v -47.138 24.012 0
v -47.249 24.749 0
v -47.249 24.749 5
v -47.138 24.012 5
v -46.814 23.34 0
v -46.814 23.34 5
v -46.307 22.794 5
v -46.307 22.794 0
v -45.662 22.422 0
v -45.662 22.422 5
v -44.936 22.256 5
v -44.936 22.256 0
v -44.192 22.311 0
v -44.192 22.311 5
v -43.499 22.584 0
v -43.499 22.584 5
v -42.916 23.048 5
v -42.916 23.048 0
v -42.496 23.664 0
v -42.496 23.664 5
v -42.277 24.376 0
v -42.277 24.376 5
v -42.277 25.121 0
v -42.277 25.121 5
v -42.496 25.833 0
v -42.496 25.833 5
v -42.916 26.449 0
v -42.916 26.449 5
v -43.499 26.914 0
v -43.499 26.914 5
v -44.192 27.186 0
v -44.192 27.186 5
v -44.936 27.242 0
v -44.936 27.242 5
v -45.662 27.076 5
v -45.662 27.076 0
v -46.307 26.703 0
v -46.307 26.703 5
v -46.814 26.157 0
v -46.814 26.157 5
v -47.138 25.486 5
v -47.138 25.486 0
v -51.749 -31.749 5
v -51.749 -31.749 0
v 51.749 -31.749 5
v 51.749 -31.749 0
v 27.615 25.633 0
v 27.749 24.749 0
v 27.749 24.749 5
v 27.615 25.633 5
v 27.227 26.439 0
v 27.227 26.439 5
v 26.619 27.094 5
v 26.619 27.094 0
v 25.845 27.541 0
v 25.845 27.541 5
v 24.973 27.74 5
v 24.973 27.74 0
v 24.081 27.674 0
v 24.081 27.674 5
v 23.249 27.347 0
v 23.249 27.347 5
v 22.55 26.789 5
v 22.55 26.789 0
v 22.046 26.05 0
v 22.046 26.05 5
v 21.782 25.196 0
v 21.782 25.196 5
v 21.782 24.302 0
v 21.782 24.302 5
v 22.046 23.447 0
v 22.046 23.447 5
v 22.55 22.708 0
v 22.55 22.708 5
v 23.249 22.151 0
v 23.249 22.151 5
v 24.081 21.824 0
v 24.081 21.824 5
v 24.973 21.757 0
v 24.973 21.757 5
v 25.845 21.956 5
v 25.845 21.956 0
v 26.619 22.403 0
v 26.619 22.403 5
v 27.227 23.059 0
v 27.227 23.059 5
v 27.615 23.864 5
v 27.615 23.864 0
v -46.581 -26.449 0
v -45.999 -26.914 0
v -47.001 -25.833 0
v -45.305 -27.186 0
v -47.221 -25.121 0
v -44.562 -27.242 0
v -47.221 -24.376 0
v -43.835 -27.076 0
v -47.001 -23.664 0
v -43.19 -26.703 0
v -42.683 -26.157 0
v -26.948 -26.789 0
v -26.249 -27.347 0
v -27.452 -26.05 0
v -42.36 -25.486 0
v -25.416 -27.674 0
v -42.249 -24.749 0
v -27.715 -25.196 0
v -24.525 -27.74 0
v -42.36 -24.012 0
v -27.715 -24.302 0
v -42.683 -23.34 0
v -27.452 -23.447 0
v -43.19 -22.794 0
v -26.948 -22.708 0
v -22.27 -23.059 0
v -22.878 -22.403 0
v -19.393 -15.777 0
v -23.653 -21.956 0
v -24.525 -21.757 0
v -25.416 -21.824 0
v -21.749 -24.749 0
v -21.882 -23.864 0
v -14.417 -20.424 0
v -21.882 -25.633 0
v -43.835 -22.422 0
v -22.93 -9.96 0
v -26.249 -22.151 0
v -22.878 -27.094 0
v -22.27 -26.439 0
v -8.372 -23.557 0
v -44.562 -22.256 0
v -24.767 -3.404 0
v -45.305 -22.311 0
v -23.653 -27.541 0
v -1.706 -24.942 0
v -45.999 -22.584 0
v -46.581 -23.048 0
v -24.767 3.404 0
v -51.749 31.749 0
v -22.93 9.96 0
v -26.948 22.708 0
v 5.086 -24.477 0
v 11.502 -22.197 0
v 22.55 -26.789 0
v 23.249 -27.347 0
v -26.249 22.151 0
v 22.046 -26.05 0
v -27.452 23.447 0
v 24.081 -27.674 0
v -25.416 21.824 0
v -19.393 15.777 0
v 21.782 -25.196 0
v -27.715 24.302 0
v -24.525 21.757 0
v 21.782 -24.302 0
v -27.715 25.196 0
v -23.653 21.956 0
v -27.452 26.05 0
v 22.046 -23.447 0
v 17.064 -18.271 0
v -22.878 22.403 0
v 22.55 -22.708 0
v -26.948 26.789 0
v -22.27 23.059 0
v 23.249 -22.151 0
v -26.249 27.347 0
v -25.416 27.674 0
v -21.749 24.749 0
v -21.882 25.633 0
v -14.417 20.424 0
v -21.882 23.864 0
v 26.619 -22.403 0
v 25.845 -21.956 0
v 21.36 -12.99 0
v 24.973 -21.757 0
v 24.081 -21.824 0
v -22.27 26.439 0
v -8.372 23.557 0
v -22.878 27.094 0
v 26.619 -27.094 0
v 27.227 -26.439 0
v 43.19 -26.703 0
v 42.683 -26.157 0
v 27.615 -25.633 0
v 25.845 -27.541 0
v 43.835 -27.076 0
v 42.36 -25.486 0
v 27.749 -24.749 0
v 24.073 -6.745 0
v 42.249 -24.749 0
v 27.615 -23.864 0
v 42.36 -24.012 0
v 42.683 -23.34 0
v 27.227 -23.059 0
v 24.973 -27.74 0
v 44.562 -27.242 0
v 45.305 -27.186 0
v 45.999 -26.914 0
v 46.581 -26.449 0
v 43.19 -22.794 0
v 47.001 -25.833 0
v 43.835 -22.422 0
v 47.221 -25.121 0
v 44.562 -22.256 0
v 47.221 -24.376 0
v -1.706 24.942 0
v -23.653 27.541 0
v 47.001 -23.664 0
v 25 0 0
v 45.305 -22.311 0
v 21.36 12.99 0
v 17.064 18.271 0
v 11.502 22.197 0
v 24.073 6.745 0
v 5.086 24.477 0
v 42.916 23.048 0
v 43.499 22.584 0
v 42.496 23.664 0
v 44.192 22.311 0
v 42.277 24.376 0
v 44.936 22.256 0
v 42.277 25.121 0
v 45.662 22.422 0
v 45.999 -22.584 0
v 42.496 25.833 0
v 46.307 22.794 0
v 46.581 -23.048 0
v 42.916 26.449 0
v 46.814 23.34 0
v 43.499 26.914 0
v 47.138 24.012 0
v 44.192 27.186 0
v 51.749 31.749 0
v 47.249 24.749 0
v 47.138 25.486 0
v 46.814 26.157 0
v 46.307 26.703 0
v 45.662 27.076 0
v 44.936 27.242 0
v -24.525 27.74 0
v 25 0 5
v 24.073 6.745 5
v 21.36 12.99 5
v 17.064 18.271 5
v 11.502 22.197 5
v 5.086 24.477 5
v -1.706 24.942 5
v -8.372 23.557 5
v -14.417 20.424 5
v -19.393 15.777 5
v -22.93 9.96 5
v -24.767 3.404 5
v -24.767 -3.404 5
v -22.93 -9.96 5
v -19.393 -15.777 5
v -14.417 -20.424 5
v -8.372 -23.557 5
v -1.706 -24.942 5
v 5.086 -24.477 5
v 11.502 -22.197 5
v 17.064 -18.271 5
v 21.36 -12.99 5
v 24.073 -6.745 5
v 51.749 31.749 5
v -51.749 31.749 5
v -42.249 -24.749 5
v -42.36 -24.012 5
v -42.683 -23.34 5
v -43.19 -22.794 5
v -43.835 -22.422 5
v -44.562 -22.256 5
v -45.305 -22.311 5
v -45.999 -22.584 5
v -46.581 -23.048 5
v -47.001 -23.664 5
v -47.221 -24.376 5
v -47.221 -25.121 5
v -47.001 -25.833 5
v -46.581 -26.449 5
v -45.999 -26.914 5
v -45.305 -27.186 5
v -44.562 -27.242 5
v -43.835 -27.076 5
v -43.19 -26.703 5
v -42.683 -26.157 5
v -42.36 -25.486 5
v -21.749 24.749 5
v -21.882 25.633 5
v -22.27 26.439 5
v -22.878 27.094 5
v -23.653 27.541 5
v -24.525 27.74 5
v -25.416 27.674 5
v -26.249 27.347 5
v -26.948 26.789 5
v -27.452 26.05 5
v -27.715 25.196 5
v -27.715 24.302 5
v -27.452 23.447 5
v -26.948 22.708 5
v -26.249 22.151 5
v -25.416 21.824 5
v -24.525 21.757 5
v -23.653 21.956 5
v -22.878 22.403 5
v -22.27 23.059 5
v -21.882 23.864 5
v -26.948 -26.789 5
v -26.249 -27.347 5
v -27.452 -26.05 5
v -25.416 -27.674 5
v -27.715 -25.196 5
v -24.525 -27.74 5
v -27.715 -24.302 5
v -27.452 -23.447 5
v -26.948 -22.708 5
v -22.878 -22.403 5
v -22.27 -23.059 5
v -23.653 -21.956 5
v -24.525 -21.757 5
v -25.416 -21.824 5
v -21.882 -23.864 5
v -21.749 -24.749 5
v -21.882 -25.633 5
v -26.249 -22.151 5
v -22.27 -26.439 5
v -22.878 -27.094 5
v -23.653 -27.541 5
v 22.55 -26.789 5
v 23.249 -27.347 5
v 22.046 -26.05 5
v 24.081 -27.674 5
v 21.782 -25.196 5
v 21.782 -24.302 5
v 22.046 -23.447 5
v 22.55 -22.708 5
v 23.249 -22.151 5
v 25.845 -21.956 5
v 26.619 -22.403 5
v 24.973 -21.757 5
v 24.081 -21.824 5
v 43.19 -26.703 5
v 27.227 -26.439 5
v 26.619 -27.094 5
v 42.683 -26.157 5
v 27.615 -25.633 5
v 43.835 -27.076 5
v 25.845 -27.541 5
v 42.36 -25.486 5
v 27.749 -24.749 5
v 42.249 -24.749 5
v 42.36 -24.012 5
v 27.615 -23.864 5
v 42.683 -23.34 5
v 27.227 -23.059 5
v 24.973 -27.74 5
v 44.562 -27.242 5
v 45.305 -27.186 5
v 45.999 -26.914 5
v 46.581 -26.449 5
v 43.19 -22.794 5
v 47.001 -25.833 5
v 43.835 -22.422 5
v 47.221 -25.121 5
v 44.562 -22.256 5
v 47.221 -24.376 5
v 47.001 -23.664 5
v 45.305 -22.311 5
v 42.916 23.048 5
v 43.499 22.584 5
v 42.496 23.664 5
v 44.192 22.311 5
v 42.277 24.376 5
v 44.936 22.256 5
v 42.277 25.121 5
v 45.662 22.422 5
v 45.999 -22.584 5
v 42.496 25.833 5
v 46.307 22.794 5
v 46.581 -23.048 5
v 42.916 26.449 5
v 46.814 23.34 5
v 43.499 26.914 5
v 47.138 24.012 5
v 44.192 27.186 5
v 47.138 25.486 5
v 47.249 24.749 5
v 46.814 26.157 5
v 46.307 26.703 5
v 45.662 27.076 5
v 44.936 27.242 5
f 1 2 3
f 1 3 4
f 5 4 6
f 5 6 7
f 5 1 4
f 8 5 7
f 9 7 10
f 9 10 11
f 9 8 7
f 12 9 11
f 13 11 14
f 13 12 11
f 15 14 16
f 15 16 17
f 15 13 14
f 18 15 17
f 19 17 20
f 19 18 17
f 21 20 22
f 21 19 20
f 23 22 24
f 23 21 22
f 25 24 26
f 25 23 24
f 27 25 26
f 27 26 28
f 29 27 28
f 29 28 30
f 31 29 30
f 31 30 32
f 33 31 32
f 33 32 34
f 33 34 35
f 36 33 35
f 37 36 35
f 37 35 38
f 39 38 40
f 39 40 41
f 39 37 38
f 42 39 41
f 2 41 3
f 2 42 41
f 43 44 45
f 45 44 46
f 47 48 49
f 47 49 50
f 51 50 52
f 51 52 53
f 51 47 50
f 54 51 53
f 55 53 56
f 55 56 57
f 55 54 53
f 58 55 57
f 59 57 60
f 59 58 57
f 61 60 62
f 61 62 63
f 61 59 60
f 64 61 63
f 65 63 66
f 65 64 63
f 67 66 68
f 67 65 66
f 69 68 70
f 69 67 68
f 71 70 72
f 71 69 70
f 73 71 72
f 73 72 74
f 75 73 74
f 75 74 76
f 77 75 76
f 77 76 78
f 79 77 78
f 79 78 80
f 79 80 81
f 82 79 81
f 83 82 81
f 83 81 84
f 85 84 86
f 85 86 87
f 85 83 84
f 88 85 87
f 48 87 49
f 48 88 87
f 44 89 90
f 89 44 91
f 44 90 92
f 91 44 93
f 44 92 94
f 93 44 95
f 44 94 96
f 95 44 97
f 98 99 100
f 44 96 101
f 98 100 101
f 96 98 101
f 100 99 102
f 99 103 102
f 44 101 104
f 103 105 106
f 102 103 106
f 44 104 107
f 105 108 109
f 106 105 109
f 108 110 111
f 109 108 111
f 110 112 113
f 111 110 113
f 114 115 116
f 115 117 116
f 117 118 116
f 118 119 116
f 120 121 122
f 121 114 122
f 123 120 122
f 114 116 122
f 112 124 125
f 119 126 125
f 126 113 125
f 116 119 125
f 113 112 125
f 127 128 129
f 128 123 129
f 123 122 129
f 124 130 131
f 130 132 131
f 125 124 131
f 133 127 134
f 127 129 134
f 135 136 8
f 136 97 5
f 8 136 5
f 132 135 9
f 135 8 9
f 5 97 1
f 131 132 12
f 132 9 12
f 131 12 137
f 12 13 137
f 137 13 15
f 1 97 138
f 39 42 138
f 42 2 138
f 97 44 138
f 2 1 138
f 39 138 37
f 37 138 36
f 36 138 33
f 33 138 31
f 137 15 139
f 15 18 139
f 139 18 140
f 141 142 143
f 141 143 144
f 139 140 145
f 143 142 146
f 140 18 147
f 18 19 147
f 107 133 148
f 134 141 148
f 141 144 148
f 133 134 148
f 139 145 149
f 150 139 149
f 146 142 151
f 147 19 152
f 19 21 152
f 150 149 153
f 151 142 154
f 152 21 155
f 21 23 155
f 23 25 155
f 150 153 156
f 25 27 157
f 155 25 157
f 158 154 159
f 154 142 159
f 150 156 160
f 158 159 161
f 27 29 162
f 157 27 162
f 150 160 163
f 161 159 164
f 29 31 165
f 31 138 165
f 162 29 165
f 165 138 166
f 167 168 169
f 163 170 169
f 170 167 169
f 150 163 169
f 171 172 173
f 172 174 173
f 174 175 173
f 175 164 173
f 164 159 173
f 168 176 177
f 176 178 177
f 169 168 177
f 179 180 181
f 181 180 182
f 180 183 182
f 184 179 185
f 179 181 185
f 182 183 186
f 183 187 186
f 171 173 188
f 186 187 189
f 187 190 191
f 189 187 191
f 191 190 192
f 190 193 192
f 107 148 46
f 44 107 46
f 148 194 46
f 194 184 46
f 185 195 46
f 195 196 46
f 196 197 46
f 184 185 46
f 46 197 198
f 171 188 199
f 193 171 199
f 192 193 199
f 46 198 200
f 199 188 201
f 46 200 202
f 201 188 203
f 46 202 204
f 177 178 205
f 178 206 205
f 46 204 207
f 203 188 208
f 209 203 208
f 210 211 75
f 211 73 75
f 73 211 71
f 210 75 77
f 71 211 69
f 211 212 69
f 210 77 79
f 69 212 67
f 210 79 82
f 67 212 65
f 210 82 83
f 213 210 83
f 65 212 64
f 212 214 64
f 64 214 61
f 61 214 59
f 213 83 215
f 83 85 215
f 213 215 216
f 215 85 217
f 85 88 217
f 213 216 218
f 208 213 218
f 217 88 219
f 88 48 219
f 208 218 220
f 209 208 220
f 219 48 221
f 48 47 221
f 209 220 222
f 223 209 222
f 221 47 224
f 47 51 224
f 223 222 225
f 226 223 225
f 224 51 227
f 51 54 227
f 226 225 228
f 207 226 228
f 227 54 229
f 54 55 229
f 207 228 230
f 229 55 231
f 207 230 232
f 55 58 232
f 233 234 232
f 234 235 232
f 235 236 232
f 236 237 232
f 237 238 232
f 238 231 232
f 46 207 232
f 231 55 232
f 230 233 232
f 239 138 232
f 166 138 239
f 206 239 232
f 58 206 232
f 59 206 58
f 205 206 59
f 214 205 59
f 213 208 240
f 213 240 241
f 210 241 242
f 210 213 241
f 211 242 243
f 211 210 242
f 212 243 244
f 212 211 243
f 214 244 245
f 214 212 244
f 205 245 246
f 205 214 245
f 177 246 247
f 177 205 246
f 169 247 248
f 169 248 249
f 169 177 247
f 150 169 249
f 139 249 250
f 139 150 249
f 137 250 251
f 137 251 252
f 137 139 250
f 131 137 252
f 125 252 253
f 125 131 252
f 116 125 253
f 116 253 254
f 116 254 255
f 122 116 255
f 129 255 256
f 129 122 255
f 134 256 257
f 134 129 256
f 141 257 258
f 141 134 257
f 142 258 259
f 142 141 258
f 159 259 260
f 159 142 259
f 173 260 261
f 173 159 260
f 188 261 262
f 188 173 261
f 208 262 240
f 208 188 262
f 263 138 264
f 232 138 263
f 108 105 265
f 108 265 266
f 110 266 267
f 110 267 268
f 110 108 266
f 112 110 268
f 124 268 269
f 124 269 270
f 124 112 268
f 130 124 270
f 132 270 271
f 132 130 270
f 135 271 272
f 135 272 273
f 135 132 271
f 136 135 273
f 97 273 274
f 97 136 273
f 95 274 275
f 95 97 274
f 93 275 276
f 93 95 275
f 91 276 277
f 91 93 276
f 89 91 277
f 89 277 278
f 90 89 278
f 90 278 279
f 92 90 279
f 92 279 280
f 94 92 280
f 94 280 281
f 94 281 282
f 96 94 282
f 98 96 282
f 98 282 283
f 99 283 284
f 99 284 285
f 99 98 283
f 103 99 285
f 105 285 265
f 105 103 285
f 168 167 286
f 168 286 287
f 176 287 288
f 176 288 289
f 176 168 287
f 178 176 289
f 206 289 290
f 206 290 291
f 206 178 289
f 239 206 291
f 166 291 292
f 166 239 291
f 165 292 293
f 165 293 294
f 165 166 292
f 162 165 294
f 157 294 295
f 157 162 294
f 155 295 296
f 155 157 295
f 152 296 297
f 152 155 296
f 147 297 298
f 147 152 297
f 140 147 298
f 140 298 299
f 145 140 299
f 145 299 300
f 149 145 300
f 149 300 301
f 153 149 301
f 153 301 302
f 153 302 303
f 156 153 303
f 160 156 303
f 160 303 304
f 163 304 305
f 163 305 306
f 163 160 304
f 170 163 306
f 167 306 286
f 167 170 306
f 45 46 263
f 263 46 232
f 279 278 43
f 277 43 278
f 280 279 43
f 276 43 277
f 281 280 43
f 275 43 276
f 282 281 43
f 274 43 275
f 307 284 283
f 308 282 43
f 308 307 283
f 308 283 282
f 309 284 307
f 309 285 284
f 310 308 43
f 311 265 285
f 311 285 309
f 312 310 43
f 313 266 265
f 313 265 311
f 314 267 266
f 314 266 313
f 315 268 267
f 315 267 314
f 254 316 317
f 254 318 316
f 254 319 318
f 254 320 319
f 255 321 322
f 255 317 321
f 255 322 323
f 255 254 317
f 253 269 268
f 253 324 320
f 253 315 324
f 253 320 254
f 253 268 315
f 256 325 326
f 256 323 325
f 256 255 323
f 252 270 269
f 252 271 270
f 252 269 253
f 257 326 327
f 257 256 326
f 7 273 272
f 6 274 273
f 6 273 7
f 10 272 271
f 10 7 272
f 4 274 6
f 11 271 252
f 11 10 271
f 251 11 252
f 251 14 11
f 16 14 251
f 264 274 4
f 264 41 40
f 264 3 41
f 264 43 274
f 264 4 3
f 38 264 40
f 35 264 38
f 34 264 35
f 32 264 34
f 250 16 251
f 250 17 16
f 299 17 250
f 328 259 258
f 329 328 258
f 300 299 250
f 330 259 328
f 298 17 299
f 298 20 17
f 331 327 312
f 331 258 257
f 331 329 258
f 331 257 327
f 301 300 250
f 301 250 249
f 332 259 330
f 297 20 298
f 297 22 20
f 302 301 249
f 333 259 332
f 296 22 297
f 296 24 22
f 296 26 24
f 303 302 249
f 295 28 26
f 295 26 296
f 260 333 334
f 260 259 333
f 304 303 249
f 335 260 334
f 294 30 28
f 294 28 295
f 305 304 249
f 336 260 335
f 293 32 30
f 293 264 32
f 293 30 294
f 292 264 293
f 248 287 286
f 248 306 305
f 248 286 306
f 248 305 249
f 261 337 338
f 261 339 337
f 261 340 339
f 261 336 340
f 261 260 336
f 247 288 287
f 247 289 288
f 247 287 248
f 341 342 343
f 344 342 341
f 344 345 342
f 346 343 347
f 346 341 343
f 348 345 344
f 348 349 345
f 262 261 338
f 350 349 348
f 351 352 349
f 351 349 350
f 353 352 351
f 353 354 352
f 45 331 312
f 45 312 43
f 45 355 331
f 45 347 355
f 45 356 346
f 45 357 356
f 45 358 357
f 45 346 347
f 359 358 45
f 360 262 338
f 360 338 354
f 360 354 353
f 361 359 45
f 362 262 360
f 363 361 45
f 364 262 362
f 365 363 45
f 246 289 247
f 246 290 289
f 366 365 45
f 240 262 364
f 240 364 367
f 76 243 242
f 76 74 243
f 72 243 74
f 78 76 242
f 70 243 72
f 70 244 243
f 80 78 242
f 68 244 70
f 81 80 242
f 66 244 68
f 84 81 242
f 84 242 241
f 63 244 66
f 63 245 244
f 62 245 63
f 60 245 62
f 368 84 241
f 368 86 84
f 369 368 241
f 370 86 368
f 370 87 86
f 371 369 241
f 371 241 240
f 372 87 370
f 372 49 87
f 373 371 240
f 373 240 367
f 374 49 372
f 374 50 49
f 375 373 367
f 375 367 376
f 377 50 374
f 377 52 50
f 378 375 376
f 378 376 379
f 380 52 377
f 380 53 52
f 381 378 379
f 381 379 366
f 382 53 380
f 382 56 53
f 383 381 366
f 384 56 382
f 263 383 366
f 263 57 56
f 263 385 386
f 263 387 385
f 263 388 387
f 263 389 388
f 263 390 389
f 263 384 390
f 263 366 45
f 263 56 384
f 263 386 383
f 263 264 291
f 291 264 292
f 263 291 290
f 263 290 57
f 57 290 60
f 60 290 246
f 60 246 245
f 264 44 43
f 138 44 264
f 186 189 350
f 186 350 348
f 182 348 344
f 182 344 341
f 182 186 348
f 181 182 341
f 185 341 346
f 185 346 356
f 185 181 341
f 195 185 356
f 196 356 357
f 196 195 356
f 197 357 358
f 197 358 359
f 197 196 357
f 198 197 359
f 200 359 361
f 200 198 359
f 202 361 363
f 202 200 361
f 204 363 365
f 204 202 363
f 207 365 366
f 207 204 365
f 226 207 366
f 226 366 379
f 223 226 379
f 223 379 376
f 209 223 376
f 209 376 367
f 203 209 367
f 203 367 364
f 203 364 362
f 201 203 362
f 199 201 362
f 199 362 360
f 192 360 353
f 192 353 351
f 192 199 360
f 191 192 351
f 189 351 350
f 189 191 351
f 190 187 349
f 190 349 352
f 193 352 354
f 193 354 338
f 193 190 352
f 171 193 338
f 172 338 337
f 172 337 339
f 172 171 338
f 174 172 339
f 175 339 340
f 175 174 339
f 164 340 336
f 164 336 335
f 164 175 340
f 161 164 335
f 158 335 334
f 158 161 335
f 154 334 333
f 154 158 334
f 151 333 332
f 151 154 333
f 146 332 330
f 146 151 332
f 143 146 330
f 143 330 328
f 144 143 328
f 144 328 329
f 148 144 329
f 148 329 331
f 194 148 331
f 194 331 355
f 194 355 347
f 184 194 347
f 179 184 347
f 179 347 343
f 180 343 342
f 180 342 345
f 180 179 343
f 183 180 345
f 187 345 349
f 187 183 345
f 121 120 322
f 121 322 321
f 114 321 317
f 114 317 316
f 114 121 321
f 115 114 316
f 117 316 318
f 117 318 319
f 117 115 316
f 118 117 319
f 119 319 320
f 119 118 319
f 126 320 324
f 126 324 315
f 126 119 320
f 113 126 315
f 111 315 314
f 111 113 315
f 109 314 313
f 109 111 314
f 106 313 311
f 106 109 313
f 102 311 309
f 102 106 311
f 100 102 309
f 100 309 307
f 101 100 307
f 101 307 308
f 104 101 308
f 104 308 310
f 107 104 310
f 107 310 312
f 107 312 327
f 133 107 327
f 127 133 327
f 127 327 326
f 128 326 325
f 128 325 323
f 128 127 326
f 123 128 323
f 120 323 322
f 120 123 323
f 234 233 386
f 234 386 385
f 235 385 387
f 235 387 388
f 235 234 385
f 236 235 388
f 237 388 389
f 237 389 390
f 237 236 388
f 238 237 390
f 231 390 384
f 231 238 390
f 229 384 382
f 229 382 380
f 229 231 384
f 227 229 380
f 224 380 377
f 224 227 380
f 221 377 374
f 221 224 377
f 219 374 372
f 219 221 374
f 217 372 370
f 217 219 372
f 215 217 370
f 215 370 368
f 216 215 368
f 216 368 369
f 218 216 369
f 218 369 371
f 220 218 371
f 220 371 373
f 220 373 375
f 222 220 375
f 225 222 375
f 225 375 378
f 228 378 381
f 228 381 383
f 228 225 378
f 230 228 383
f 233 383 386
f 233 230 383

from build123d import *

# Parameters (mm, degrees)
SKETCH1_W           = 103.497474684
SKETCH1_H           = 63.497474684
SKETCH1_R           = 25
SKETCH1_R_2         = 3
SKETCH1_R_3         = 2.5
BOSS_EXTRUDE1_DEPTH = 5


with BuildPart() as part:
    # Sketch1 → Boss-Extrude1 (new body)
    with BuildSketch(Plane.XY):
        Rectangle(SKETCH1_W, SKETCH1_H)
        Circle(SKETCH1_R, mode=Mode.SUBTRACT)
        with Locations((24.748737342, 24.748737342)):
            Circle(SKETCH1_R_2, mode=Mode.SUBTRACT)
        with Locations((24.748737342, -24.748737342)):
            Circle(SKETCH1_R_2, mode=Mode.SUBTRACT)
        with Locations((-24.748737342, -24.748737342)):
            Circle(SKETCH1_R_2, mode=Mode.SUBTRACT)
        with Locations((-24.748737342, 24.748737342)):
            Circle(SKETCH1_R_2, mode=Mode.SUBTRACT)
        with Locations((44.748737342, 24.748737342)):
            Circle(SKETCH1_R_3, mode=Mode.SUBTRACT)
        with Locations(Location((44.748737342, -24.748737342, 0), (0, 0, 180))):
            Circle(SKETCH1_R_3, mode=Mode.SUBTRACT)
        with Locations((-44.748737342, -24.748737342)):
            Circle(SKETCH1_R_3, mode=Mode.SUBTRACT)
        with Locations(Location((-44.748737342, 24.748737342, 0), (0, 0, 180))):
            Circle(SKETCH1_R_3, mode=Mode.SUBTRACT)
    extrude(amount=BOSS_EXTRUDE1_DEPTH)


solid = part.part
